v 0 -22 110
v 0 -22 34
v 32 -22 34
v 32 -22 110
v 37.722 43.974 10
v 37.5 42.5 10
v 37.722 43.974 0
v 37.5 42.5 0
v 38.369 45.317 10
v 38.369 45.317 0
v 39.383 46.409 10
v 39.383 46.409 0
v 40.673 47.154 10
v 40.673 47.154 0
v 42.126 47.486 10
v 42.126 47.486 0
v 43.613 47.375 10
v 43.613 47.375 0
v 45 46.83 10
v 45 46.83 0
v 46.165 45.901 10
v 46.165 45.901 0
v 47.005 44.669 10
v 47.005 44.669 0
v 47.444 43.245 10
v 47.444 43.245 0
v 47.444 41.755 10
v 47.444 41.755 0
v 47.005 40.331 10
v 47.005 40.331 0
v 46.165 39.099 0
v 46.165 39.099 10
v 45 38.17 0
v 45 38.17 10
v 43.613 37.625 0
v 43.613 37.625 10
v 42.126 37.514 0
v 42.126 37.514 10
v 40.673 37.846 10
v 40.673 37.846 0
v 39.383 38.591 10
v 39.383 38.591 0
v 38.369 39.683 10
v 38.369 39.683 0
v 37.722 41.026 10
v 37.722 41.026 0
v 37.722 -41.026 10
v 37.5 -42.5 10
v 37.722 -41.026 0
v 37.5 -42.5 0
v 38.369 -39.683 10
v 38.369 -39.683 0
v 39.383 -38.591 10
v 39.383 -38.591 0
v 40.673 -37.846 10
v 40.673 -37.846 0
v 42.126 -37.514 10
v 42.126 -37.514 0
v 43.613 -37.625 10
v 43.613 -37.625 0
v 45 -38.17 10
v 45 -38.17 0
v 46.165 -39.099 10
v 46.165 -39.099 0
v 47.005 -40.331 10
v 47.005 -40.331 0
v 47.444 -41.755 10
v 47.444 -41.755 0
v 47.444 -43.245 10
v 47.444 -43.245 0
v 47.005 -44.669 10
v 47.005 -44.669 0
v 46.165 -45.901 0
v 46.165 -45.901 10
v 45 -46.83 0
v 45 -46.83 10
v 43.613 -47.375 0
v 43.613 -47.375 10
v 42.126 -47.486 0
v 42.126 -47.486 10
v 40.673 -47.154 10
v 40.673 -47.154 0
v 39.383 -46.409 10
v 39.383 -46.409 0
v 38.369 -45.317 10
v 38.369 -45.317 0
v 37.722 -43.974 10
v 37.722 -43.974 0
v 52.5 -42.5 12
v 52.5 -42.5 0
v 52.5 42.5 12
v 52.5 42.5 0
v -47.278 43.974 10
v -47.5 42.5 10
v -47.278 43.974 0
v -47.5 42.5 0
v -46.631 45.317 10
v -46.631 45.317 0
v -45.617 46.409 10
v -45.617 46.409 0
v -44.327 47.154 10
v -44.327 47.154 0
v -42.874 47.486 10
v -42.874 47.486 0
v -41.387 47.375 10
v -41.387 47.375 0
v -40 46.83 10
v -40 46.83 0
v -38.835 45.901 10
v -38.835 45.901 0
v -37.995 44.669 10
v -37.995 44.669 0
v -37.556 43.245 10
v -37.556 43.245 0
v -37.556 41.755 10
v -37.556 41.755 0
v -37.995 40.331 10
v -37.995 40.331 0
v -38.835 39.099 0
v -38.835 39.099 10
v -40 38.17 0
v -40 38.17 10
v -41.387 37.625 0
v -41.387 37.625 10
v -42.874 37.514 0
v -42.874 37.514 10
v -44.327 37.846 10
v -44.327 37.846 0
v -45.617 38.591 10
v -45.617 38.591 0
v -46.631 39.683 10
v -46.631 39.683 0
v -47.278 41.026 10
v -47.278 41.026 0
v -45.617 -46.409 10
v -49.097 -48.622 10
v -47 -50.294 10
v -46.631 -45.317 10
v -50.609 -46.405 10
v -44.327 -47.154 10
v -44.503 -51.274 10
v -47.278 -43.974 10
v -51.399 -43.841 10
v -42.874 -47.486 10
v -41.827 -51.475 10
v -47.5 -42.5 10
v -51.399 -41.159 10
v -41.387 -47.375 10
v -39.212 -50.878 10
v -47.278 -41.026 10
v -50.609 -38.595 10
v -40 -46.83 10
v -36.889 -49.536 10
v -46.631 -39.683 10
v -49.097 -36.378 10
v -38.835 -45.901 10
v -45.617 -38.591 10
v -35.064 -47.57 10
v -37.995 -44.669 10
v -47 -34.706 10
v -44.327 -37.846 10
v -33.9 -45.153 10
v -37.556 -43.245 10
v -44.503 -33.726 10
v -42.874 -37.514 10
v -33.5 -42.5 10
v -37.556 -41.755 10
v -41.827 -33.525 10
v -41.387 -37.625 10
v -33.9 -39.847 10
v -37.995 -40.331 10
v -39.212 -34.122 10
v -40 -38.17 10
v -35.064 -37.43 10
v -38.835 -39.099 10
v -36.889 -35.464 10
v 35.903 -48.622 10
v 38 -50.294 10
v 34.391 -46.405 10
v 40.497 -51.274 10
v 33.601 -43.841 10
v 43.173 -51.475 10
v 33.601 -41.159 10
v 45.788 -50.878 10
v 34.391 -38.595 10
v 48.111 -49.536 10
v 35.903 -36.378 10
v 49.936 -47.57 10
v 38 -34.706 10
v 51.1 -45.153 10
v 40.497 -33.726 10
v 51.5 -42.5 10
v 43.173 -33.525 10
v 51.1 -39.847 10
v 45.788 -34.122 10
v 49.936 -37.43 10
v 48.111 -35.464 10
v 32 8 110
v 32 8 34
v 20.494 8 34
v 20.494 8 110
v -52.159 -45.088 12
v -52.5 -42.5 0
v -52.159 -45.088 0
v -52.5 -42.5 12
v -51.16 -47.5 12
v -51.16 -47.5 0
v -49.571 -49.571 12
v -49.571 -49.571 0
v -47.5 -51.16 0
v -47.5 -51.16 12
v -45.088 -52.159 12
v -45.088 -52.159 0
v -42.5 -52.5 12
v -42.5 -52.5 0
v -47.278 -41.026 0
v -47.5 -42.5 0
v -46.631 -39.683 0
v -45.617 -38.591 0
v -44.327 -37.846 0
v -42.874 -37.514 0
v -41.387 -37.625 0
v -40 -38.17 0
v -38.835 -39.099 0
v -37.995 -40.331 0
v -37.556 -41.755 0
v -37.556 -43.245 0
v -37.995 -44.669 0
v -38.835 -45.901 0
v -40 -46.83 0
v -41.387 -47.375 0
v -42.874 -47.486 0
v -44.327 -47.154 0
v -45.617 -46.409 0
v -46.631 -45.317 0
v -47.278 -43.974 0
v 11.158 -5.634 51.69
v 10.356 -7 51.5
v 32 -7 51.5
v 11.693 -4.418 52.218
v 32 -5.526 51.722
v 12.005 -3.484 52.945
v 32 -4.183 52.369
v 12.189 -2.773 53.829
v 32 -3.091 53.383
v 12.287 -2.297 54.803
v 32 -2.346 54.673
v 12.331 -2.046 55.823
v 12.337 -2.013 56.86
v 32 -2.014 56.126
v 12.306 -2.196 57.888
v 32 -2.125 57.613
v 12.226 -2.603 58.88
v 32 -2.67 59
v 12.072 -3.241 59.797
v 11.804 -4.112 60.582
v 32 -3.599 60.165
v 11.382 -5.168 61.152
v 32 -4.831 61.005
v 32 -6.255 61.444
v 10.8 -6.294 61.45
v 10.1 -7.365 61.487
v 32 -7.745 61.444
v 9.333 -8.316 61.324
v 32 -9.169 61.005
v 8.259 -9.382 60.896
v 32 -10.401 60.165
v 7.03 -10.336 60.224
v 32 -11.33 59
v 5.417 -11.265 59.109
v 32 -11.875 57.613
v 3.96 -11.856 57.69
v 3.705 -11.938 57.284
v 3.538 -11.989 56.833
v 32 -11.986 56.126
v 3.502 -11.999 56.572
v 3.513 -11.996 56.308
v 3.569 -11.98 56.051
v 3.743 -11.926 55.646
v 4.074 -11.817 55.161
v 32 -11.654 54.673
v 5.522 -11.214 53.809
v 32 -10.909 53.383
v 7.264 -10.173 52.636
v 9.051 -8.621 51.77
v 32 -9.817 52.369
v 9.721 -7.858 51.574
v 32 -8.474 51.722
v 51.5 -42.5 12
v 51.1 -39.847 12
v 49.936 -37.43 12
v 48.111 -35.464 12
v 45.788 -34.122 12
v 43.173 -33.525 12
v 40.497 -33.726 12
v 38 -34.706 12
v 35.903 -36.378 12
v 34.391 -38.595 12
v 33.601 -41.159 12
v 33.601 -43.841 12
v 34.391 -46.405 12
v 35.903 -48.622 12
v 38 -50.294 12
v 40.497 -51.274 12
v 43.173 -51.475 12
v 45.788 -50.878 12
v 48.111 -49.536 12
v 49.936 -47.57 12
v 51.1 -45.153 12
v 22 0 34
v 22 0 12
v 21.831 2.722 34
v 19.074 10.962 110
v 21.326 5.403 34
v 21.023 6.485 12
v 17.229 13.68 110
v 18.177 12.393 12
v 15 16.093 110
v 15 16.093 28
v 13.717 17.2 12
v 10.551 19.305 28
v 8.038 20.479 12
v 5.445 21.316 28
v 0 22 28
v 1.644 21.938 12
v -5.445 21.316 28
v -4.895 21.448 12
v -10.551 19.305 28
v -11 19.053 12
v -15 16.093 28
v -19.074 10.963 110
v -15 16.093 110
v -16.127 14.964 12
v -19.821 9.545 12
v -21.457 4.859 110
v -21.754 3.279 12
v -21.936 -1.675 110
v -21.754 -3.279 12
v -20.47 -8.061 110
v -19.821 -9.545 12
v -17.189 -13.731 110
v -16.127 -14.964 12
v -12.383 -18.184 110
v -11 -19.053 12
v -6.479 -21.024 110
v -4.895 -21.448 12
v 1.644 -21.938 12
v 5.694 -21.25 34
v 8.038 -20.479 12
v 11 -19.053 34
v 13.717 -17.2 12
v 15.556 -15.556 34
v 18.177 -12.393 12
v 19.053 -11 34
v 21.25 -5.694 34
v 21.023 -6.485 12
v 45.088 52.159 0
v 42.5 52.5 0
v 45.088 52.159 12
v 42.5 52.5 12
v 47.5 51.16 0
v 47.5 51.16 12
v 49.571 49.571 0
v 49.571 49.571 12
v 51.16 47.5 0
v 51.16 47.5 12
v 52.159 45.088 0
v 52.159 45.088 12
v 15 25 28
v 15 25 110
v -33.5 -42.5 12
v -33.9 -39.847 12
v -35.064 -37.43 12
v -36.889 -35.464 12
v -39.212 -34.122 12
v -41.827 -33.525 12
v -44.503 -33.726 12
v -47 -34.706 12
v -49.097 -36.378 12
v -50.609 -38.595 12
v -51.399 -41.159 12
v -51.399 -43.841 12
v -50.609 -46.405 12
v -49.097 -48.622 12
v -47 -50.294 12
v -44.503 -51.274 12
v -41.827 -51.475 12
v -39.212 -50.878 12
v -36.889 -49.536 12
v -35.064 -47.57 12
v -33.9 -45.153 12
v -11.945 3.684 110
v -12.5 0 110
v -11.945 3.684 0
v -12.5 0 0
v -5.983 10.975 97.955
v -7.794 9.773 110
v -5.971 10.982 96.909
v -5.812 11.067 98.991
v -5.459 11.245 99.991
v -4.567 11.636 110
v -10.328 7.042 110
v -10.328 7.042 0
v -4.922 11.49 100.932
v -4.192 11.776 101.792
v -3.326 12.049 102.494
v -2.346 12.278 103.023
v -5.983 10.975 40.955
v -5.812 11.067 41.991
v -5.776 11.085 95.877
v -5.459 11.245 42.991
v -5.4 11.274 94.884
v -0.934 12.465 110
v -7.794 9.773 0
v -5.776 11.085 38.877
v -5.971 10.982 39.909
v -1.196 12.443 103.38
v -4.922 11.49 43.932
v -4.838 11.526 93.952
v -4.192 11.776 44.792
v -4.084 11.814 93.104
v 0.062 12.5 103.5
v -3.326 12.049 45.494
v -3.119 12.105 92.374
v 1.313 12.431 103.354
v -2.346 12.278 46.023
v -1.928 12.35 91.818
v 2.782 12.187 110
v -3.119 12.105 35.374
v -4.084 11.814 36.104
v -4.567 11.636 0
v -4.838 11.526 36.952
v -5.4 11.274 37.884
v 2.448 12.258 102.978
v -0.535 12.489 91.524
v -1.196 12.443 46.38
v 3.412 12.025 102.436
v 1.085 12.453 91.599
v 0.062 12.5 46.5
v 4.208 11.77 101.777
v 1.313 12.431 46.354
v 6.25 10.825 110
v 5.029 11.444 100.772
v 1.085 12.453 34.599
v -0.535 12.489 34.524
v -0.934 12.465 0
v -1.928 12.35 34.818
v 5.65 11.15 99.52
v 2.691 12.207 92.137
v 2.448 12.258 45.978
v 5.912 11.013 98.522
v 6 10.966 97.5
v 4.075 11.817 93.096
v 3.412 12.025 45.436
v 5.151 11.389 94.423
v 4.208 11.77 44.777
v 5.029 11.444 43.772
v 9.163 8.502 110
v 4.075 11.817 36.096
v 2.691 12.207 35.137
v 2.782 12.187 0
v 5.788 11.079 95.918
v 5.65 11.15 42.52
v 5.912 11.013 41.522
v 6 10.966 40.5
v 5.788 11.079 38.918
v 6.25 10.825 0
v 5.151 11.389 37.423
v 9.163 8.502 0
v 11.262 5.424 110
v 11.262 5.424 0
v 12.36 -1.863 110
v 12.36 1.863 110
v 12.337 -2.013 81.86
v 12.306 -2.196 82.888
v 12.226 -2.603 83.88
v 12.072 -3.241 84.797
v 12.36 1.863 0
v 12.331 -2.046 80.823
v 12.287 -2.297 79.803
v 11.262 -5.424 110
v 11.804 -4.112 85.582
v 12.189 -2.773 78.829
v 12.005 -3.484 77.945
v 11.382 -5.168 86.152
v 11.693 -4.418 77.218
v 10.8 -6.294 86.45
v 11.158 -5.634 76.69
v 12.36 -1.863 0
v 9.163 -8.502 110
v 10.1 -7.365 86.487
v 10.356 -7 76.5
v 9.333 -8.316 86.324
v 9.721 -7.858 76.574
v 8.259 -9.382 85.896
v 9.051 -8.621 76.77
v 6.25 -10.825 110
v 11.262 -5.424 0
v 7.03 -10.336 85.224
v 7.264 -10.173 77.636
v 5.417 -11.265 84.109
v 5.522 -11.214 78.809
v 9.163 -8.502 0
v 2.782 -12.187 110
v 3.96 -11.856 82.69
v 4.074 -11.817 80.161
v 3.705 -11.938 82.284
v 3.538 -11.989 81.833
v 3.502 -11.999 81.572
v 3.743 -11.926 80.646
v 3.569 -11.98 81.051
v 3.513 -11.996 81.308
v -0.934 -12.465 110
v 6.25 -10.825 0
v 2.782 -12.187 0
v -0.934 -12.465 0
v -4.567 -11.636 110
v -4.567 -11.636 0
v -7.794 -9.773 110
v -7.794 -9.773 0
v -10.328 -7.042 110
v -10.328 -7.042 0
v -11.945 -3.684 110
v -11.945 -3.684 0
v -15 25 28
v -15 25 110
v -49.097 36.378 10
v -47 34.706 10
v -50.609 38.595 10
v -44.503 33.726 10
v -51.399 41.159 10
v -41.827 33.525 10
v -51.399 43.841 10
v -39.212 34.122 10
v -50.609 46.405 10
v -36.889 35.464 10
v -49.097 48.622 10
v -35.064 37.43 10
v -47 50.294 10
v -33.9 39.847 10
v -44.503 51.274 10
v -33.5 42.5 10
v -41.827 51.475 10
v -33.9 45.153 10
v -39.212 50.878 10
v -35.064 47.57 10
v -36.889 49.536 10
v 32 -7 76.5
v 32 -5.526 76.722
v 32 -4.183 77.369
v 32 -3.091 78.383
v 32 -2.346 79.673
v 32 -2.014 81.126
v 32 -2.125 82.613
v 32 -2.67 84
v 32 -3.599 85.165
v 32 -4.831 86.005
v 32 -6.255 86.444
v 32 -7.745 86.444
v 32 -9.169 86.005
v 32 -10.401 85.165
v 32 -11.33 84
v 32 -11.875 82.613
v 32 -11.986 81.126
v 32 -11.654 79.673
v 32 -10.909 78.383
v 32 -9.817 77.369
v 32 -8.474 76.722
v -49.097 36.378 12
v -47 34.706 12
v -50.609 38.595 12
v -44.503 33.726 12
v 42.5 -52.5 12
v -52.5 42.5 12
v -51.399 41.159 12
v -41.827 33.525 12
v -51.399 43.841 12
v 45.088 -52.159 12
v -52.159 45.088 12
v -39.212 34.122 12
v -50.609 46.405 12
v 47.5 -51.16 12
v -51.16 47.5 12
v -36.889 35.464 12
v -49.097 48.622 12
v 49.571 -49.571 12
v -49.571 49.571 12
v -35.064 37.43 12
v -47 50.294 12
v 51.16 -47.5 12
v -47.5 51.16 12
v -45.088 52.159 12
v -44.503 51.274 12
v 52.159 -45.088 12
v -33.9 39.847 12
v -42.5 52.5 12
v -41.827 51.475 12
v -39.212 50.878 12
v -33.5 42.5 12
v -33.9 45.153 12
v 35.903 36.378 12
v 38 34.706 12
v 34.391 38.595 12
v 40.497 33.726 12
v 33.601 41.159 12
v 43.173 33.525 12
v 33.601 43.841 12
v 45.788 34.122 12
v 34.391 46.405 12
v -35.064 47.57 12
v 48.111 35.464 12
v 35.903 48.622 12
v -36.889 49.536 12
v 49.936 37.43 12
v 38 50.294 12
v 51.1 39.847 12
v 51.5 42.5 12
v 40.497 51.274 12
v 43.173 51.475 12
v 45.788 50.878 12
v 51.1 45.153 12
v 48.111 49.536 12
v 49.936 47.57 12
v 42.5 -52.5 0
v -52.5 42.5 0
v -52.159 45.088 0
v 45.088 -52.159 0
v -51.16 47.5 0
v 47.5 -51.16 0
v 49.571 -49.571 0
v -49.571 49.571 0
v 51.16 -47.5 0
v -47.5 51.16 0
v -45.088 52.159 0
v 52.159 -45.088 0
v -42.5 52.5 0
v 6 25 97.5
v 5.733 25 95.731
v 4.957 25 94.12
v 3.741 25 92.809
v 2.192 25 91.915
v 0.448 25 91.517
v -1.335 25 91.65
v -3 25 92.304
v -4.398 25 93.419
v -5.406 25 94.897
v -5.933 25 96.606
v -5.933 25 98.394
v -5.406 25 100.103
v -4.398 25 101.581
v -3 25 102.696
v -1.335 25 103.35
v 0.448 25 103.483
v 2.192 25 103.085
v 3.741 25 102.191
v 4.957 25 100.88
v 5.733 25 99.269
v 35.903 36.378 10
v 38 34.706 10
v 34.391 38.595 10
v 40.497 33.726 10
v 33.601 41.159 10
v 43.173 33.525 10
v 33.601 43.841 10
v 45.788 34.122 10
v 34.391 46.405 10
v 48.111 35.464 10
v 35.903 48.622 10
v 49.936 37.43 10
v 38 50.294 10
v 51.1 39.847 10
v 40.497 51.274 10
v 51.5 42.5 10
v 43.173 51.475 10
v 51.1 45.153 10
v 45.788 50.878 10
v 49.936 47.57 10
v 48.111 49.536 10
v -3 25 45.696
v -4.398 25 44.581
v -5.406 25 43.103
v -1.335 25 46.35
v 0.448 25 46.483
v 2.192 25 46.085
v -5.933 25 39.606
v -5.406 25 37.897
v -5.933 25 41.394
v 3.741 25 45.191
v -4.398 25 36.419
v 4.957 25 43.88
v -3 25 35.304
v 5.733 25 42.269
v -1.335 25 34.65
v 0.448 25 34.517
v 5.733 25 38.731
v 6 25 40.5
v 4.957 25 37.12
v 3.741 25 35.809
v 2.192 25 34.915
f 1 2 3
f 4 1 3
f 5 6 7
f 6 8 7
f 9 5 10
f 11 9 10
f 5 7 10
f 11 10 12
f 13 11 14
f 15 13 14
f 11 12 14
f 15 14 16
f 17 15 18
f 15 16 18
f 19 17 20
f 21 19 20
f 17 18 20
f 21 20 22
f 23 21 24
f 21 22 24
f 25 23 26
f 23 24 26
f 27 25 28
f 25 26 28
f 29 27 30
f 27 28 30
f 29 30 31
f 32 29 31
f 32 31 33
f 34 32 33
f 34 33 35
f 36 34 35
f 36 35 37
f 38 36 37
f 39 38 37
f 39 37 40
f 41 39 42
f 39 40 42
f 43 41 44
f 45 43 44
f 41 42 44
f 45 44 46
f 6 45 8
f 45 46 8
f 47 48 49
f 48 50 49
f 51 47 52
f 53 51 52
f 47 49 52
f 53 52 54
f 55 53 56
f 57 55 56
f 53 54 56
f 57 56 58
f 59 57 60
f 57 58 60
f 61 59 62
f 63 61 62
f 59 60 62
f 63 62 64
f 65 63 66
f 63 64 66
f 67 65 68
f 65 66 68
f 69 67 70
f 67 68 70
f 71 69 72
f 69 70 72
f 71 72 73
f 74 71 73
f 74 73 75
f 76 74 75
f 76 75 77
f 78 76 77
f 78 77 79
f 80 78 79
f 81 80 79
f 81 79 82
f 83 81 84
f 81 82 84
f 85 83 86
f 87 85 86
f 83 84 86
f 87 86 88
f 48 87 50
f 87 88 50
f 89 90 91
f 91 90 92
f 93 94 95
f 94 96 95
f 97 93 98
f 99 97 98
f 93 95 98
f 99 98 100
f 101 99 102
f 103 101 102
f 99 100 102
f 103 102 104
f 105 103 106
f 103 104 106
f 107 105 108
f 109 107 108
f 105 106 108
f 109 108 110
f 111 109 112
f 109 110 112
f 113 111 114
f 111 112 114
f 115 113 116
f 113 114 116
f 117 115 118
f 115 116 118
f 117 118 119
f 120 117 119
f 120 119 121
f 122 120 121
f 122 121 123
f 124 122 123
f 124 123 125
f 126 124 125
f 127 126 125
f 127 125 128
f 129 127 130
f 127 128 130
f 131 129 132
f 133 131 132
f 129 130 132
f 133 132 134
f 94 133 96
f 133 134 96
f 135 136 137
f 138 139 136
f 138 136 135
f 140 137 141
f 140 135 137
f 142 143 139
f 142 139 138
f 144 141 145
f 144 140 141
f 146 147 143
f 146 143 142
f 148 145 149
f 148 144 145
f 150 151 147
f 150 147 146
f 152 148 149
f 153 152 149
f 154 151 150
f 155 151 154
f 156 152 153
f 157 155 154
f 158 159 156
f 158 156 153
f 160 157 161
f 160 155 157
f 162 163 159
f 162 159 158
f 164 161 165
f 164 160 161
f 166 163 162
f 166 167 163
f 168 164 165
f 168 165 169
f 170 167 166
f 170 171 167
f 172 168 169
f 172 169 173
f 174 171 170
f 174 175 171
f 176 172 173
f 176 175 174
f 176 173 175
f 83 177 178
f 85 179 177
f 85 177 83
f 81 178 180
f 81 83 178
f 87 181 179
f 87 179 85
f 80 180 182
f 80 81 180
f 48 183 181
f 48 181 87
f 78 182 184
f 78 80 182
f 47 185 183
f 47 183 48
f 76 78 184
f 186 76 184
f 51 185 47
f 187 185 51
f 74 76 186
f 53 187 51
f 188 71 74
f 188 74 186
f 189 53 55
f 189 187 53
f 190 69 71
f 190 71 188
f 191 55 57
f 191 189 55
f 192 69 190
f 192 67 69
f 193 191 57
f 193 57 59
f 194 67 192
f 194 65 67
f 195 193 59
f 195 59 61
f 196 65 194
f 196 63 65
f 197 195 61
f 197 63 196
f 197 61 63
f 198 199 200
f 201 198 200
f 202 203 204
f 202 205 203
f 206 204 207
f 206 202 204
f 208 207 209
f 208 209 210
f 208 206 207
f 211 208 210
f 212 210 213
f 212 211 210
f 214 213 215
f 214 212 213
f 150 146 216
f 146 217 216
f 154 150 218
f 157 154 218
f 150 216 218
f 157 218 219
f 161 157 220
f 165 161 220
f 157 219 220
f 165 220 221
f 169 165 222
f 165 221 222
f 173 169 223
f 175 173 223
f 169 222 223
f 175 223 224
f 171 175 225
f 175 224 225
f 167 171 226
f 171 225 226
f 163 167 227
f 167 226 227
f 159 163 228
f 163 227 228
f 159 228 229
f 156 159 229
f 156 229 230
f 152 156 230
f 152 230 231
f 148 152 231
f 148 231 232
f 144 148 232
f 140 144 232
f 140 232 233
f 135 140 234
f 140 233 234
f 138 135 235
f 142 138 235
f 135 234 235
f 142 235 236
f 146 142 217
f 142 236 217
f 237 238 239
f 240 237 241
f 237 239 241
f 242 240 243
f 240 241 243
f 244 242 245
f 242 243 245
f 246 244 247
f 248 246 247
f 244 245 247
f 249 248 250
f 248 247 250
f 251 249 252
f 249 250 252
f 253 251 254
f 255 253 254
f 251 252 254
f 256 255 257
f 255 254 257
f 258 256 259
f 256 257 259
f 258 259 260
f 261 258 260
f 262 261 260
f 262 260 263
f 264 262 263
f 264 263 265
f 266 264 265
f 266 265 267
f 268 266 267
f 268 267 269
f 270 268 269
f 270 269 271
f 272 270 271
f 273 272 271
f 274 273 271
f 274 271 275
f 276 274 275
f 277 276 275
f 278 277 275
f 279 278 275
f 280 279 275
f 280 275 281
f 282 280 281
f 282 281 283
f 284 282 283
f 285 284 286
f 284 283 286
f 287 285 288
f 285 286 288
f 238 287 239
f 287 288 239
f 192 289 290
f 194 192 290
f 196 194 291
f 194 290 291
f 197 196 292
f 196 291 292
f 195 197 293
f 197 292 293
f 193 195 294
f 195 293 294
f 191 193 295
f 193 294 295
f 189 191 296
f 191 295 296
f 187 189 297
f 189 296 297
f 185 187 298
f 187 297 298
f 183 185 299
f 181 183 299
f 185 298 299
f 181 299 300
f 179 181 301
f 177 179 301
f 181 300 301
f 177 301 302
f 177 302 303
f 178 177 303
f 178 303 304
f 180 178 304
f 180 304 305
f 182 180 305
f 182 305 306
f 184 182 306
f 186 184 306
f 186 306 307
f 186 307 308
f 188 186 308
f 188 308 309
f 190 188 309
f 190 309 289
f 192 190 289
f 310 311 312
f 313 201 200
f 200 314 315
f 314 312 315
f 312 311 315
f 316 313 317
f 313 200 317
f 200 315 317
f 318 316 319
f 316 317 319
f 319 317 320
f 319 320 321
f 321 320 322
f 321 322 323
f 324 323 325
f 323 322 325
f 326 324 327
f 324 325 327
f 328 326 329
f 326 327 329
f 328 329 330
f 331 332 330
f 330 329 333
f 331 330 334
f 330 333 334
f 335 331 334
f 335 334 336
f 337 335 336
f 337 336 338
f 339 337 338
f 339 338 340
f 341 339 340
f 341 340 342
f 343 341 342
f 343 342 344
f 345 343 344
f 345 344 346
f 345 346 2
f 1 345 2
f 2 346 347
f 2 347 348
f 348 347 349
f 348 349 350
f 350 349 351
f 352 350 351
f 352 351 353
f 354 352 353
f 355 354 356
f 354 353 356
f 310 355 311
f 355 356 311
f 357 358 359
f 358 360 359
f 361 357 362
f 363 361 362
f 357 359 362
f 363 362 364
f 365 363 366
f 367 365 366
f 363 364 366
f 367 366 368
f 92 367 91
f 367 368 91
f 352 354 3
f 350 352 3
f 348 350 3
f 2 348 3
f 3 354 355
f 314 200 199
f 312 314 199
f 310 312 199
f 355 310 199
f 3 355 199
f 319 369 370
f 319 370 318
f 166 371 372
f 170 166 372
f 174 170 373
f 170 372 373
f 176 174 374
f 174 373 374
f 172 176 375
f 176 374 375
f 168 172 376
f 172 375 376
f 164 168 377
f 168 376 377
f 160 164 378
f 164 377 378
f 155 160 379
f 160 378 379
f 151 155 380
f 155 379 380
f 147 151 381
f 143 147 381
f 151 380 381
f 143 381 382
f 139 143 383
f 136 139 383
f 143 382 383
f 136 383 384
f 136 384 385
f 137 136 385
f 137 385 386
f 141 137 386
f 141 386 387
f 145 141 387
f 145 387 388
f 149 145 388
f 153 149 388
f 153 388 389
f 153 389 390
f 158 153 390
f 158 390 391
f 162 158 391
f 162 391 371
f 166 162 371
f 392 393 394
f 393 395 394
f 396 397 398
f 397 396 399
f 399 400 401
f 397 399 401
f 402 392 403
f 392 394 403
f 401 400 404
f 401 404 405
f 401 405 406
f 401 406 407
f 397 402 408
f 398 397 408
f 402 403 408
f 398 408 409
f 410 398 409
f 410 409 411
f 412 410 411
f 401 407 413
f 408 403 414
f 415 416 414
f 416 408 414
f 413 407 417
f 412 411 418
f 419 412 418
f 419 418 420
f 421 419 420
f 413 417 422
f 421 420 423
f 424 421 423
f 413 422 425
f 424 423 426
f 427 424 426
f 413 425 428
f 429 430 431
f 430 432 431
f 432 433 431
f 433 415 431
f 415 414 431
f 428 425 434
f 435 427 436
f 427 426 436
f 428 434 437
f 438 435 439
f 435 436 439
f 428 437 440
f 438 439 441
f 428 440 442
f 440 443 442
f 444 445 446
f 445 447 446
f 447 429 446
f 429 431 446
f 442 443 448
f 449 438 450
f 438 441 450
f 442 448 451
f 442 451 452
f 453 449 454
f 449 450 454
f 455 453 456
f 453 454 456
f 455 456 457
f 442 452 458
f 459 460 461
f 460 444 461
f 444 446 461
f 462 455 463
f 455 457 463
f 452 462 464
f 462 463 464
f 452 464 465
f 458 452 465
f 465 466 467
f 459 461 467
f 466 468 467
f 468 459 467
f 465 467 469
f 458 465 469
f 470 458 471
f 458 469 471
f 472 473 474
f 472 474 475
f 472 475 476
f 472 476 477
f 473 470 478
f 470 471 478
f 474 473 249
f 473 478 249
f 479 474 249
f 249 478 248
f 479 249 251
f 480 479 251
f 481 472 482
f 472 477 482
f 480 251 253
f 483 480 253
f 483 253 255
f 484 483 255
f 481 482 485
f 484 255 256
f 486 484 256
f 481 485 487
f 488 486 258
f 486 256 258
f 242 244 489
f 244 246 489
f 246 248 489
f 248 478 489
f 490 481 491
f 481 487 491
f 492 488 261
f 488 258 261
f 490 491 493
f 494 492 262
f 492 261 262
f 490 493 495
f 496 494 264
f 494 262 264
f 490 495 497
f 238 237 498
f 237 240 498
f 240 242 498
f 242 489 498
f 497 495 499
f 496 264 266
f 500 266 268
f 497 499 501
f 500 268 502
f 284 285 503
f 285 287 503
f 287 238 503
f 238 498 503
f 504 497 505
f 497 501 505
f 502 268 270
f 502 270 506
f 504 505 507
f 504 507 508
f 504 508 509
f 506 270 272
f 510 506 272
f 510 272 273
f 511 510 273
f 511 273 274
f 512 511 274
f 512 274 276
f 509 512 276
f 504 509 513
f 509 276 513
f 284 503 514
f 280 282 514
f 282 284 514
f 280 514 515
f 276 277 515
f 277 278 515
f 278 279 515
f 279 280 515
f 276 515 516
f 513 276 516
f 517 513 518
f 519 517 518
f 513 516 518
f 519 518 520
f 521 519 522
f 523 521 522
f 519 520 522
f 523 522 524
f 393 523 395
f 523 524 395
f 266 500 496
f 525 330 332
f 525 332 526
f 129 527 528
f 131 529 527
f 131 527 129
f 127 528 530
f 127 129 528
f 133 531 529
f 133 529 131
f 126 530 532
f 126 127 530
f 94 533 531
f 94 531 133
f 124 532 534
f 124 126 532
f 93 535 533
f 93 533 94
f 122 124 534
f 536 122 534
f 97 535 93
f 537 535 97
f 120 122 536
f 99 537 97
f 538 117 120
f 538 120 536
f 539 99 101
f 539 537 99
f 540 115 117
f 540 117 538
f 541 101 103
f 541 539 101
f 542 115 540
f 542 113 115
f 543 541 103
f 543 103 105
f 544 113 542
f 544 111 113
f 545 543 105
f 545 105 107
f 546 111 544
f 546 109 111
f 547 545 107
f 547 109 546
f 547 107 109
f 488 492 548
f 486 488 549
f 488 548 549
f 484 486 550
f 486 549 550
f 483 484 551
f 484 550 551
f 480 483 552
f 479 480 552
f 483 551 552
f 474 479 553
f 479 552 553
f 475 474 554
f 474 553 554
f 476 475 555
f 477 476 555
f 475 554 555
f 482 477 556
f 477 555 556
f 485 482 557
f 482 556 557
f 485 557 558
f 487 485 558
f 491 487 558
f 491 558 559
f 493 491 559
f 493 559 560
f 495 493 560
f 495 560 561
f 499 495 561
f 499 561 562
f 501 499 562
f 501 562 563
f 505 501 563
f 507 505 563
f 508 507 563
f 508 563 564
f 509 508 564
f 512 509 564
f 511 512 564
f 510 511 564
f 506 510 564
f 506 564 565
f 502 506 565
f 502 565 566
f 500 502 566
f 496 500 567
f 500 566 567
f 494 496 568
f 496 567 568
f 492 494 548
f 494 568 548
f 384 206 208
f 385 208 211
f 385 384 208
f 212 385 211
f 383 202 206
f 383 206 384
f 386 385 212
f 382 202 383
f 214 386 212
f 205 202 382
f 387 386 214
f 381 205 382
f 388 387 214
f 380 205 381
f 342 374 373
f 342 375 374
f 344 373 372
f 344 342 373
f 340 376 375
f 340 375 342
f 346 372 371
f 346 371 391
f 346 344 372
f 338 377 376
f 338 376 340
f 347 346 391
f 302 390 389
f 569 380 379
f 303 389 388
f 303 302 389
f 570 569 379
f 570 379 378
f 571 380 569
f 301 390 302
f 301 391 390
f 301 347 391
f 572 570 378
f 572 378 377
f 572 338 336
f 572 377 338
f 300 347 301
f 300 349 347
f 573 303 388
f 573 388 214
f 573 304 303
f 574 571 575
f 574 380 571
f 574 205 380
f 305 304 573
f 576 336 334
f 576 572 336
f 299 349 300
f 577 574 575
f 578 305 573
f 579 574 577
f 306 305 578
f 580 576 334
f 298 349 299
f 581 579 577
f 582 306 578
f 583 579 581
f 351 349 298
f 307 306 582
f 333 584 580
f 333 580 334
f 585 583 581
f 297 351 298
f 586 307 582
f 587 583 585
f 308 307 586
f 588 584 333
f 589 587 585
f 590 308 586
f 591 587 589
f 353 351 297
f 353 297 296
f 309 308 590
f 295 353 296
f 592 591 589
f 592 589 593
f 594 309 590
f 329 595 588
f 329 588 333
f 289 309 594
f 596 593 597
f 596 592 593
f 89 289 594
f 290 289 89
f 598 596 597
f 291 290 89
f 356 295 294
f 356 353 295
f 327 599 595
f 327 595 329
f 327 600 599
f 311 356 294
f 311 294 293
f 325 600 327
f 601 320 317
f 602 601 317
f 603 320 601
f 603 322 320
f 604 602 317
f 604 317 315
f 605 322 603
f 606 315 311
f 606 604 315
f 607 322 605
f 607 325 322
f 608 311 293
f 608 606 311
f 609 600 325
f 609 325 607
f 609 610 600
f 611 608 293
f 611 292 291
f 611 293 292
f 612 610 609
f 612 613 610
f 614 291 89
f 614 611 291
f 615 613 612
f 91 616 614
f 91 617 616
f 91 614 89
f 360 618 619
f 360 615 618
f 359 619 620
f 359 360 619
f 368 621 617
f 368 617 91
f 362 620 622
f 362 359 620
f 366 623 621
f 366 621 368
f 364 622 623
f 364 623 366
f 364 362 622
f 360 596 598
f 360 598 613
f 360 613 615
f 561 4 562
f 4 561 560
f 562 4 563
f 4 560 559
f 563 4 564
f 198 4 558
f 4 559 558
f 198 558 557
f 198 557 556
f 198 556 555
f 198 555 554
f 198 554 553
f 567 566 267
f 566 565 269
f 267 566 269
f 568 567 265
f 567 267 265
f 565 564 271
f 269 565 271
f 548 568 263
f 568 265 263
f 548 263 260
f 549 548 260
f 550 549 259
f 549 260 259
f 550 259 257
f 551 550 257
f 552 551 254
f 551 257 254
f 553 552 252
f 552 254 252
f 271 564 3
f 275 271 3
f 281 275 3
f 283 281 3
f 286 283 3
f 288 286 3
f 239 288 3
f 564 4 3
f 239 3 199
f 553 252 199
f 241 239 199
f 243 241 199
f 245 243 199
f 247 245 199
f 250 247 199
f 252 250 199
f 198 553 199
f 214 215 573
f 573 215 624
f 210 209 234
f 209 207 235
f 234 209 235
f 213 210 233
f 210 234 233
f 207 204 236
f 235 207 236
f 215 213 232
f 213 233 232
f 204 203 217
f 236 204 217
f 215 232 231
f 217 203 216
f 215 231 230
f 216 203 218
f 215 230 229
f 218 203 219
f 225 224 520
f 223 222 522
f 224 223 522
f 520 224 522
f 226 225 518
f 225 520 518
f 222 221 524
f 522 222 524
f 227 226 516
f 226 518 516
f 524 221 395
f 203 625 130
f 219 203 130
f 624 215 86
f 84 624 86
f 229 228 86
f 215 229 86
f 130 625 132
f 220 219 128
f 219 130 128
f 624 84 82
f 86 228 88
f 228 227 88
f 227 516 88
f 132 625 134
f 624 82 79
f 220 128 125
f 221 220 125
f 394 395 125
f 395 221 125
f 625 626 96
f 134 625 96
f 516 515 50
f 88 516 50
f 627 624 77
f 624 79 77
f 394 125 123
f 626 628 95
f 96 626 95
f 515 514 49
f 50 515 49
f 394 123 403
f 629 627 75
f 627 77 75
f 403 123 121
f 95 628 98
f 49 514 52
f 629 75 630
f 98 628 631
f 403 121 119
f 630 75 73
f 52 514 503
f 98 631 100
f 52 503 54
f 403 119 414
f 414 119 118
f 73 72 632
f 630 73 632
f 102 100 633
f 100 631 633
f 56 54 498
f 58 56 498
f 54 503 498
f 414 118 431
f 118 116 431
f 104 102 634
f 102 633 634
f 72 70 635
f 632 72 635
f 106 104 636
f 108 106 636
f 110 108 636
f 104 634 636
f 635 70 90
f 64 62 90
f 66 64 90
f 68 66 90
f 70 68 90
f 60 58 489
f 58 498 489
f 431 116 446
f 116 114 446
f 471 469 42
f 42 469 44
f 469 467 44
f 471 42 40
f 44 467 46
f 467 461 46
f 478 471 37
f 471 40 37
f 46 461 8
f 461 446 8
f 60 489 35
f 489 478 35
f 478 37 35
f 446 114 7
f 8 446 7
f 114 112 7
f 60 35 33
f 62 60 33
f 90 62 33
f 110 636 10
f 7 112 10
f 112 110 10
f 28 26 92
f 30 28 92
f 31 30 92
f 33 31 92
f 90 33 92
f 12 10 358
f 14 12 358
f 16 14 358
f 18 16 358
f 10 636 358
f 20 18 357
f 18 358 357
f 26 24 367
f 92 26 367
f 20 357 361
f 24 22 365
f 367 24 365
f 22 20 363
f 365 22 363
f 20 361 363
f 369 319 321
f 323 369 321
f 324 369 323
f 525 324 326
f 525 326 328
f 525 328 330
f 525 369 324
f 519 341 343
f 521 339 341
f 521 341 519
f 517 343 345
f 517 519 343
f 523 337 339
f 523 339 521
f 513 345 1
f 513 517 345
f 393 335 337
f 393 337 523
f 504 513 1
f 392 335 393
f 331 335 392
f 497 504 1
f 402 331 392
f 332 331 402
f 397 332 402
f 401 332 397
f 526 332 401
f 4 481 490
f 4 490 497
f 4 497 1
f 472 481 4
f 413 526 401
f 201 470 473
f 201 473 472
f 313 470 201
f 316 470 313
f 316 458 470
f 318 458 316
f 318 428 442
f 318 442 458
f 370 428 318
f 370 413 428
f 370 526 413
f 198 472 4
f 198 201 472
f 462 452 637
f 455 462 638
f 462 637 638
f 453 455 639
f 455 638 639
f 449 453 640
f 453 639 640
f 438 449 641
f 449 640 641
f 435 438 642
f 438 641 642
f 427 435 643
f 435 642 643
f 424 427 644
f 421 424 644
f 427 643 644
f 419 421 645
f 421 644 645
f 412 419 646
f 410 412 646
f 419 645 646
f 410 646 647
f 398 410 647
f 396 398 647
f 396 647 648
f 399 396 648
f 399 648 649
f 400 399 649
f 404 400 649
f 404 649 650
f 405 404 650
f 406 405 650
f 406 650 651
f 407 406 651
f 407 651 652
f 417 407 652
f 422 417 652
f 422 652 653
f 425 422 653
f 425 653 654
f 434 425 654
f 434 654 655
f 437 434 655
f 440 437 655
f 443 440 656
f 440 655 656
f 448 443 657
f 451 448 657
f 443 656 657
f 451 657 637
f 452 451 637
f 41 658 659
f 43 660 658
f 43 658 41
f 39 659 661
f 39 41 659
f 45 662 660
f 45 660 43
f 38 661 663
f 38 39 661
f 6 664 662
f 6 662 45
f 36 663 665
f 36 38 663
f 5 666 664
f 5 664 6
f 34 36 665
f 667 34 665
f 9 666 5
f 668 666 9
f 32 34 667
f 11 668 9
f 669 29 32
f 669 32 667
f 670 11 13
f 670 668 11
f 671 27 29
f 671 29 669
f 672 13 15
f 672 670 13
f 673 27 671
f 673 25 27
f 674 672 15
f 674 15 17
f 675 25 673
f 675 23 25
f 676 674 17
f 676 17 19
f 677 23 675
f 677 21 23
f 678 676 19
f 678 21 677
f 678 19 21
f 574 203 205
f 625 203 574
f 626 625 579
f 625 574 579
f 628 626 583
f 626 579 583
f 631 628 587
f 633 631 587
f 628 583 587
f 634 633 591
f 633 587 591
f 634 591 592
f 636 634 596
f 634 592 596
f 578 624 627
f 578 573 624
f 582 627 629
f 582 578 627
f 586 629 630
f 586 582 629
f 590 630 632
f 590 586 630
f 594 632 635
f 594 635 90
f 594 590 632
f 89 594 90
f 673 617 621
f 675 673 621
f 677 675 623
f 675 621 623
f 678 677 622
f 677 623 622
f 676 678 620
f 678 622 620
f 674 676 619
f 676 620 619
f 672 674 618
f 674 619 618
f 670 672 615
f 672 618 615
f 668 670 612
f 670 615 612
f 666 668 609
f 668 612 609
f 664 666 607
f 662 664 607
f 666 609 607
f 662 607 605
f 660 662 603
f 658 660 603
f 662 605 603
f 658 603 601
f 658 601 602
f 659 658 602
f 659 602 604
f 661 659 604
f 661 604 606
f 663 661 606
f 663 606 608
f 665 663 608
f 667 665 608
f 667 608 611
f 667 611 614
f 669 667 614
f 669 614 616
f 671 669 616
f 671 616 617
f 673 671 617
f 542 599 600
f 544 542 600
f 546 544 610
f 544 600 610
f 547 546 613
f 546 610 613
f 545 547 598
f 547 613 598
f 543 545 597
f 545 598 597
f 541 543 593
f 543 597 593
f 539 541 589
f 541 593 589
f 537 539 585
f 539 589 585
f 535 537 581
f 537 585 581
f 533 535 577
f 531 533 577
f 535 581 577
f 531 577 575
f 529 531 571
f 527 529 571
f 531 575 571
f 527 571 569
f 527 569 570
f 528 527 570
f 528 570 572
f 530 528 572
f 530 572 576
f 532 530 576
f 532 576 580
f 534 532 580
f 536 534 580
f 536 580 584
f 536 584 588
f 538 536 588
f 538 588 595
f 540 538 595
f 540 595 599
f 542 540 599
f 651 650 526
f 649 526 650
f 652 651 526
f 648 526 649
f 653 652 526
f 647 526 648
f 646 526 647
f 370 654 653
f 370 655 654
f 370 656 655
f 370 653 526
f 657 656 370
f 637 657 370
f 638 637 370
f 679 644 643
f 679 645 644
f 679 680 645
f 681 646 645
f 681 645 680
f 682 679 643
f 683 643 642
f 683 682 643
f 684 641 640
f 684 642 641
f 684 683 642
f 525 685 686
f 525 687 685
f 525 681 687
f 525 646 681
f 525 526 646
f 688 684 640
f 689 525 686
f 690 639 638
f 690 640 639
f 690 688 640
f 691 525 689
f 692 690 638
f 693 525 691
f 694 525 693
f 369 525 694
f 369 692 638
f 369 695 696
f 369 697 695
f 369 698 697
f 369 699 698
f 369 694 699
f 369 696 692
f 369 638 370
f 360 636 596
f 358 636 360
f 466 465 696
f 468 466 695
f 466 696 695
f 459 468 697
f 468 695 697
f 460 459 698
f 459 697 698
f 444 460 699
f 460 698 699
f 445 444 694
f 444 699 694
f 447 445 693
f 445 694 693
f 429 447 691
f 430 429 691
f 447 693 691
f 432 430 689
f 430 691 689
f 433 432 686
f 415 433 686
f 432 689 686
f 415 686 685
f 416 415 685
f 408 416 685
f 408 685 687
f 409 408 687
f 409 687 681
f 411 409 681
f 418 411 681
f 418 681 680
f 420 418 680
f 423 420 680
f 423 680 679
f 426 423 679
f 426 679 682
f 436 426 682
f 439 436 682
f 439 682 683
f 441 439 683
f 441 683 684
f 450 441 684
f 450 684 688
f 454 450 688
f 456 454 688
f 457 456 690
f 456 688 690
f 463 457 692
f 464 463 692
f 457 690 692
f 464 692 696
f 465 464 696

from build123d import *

# Parameters (mm, degrees)
SKETCH1_W           = 105
SKETCH1_H           = 105
BOSS_EXTRUDE1_DEPTH = 12
SKETCH2_R           = 22
BOSS_EXTRUDE2_DEPTH = 98
BOSS_EXTRUDE3_START = -82
BOSS_EXTRUDE3_DEPTH = 82
HOLE1_D             = 25
HOLE2_REACH         = 146.439
HOLE2_BORE_R        = 6
BOSS_EXTRUDE4_START = -76
BOSS_EXTRUDE4_DEPTH = 76
HOLE3_REACH         = 150.312
HOLE3_BORE_R        = 5
FILLET1_R           = 10
HOLE4_D             = 10
HOLE4_CBORE_D       = 18
HOLE4_CBORE_DEPTH   = 2


with BuildPart() as part:
    # Sketch1 → Boss-Extrude1 (new body)
    with BuildSketch(Plane.XY):
        Rectangle(SKETCH1_W, SKETCH1_H)
    extrude(amount=BOSS_EXTRUDE1_DEPTH)

    # Sketch2 → Boss-Extrude2 (add)
    with BuildSketch(Plane.XY.offset(12)):
        Circle(SKETCH2_R)
    extrude(amount=BOSS_EXTRUDE2_DEPTH)

    # Sketch3 → Boss-Extrude3 (add)
    with BuildSketch(Plane.XY.offset(110).offset(BOSS_EXTRUDE3_START)):
        with BuildLine():
            Line((-15, 16.093476939), (-15, 25))
            Line((-15, 25), (15, 25))
            Line((15, 25), (15, 16.093476939))
            ThreePointArc((15, 16.093476939), (0, 22), (-15, 16.093476939))
        make_face()
    extrude(amount=BOSS_EXTRUDE3_DEPTH)

    # Hole1 (through all)
    with Locations(Plane.XY.offset(110)):
        with Locations((0, 0)):
            Hole(HOLE1_D / 2)

    # Hole2 bore → Hole2 (cut, up to next)
    with BuildSketch(Plane(origin=(0, 25, 0), x_dir=(1, 0, 0), z_dir=(0, 1, 0)), mode=Mode.PRIVATE) as hole2_sk1:
        with Locations((0, -40.5)):
            Circle(HOLE2_BORE_R)
    hole2_tool1 = extrude(hole2_sk1.sketch, amount=-HOLE2_REACH, mode=Mode.PRIVATE) & part.part
    # Hole2 bore → Hole2 (cut, up to next)
    with BuildSketch(Plane(origin=(0, 25, 0), x_dir=(1, 0, 0), z_dir=(0, 1, 0)), mode=Mode.PRIVATE) as hole2_sk2:
        with Locations((0, -97.5)):
            Circle(HOLE2_BORE_R)
    hole2_tool2 = extrude(hole2_sk2.sketch, amount=-HOLE2_REACH, mode=Mode.PRIVATE) & part.part
    add(hole2_tool1.solids().sort_by_distance((0, 25, 40.5))[0], mode=Mode.SUBTRACT)
    add(hole2_tool2.solids().sort_by_distance((0, 25, 97.5))[0], mode=Mode.SUBTRACT)

    # Sketch9 → Boss-Extrude4 (add)
    with BuildSketch(Plane.XY.offset(110).offset(BOSS_EXTRUDE4_START)):
        with BuildLine():
            Line((0, -22), (32, -22))
            Line((32, -22), (32, 8))
            Line((32, 8), (20.493901532, 8))
            ThreePointArc((20.493901532, 8), (18.165902125, -12.409673646), (0, -22))
        make_face()
    extrude(amount=BOSS_EXTRUDE4_DEPTH)

    # Hole3 bore → Hole3 (cut, up to next)
    with BuildSketch(Plane(origin=(32, 0, 0), x_dir=(0, 0, -1), z_dir=(1, 0, 0)), mode=Mode.PRIVATE) as hole3_sk1:
        with Locations((-81.5, -7)):
            Circle(HOLE3_BORE_R)
    hole3_tool1 = extrude(hole3_sk1.sketch, amount=-HOLE3_REACH, mode=Mode.PRIVATE) & part.part
    # Hole3 bore → Hole3 (cut, up to next)
    with BuildSketch(Plane(origin=(32, 0, 0), x_dir=(0, 0, -1), z_dir=(1, 0, 0)), mode=Mode.PRIVATE) as hole3_sk2:
        with Locations((-56.5, -7)):
            Circle(HOLE3_BORE_R)
    hole3_tool2 = extrude(hole3_sk2.sketch, amount=-HOLE3_REACH, mode=Mode.PRIVATE) & part.part
    add(hole3_tool1.solids().sort_by_distance((32, -7, 81.5))[0], mode=Mode.SUBTRACT)
    add(hole3_tool2.solids().sort_by_distance((32, -7, 56.5))[0], mode=Mode.SUBTRACT)

    # Fillet1
    fillet1_edges = [part.edges().sort_by_distance(p)[0] for p in [
        (52.5, -52.5, 6),
        (-52.5, -52.5, 6),
        (-52.5, 52.5, 6),
        (52.5, 52.5, 6),
    ]]
    fillet(fillet1_edges, radius=FILLET1_R)

    # Hole4 (through all)
    with Locations(Plane.XY.offset(12)):
        with Locations((42.5, -42.5), (42.5, 42.5), (-42.5, 42.5), (-42.5, -42.5)):
            CounterBoreHole(HOLE4_D / 2, HOLE4_CBORE_D / 2, HOLE4_CBORE_DEPTH)


solid = part.part
